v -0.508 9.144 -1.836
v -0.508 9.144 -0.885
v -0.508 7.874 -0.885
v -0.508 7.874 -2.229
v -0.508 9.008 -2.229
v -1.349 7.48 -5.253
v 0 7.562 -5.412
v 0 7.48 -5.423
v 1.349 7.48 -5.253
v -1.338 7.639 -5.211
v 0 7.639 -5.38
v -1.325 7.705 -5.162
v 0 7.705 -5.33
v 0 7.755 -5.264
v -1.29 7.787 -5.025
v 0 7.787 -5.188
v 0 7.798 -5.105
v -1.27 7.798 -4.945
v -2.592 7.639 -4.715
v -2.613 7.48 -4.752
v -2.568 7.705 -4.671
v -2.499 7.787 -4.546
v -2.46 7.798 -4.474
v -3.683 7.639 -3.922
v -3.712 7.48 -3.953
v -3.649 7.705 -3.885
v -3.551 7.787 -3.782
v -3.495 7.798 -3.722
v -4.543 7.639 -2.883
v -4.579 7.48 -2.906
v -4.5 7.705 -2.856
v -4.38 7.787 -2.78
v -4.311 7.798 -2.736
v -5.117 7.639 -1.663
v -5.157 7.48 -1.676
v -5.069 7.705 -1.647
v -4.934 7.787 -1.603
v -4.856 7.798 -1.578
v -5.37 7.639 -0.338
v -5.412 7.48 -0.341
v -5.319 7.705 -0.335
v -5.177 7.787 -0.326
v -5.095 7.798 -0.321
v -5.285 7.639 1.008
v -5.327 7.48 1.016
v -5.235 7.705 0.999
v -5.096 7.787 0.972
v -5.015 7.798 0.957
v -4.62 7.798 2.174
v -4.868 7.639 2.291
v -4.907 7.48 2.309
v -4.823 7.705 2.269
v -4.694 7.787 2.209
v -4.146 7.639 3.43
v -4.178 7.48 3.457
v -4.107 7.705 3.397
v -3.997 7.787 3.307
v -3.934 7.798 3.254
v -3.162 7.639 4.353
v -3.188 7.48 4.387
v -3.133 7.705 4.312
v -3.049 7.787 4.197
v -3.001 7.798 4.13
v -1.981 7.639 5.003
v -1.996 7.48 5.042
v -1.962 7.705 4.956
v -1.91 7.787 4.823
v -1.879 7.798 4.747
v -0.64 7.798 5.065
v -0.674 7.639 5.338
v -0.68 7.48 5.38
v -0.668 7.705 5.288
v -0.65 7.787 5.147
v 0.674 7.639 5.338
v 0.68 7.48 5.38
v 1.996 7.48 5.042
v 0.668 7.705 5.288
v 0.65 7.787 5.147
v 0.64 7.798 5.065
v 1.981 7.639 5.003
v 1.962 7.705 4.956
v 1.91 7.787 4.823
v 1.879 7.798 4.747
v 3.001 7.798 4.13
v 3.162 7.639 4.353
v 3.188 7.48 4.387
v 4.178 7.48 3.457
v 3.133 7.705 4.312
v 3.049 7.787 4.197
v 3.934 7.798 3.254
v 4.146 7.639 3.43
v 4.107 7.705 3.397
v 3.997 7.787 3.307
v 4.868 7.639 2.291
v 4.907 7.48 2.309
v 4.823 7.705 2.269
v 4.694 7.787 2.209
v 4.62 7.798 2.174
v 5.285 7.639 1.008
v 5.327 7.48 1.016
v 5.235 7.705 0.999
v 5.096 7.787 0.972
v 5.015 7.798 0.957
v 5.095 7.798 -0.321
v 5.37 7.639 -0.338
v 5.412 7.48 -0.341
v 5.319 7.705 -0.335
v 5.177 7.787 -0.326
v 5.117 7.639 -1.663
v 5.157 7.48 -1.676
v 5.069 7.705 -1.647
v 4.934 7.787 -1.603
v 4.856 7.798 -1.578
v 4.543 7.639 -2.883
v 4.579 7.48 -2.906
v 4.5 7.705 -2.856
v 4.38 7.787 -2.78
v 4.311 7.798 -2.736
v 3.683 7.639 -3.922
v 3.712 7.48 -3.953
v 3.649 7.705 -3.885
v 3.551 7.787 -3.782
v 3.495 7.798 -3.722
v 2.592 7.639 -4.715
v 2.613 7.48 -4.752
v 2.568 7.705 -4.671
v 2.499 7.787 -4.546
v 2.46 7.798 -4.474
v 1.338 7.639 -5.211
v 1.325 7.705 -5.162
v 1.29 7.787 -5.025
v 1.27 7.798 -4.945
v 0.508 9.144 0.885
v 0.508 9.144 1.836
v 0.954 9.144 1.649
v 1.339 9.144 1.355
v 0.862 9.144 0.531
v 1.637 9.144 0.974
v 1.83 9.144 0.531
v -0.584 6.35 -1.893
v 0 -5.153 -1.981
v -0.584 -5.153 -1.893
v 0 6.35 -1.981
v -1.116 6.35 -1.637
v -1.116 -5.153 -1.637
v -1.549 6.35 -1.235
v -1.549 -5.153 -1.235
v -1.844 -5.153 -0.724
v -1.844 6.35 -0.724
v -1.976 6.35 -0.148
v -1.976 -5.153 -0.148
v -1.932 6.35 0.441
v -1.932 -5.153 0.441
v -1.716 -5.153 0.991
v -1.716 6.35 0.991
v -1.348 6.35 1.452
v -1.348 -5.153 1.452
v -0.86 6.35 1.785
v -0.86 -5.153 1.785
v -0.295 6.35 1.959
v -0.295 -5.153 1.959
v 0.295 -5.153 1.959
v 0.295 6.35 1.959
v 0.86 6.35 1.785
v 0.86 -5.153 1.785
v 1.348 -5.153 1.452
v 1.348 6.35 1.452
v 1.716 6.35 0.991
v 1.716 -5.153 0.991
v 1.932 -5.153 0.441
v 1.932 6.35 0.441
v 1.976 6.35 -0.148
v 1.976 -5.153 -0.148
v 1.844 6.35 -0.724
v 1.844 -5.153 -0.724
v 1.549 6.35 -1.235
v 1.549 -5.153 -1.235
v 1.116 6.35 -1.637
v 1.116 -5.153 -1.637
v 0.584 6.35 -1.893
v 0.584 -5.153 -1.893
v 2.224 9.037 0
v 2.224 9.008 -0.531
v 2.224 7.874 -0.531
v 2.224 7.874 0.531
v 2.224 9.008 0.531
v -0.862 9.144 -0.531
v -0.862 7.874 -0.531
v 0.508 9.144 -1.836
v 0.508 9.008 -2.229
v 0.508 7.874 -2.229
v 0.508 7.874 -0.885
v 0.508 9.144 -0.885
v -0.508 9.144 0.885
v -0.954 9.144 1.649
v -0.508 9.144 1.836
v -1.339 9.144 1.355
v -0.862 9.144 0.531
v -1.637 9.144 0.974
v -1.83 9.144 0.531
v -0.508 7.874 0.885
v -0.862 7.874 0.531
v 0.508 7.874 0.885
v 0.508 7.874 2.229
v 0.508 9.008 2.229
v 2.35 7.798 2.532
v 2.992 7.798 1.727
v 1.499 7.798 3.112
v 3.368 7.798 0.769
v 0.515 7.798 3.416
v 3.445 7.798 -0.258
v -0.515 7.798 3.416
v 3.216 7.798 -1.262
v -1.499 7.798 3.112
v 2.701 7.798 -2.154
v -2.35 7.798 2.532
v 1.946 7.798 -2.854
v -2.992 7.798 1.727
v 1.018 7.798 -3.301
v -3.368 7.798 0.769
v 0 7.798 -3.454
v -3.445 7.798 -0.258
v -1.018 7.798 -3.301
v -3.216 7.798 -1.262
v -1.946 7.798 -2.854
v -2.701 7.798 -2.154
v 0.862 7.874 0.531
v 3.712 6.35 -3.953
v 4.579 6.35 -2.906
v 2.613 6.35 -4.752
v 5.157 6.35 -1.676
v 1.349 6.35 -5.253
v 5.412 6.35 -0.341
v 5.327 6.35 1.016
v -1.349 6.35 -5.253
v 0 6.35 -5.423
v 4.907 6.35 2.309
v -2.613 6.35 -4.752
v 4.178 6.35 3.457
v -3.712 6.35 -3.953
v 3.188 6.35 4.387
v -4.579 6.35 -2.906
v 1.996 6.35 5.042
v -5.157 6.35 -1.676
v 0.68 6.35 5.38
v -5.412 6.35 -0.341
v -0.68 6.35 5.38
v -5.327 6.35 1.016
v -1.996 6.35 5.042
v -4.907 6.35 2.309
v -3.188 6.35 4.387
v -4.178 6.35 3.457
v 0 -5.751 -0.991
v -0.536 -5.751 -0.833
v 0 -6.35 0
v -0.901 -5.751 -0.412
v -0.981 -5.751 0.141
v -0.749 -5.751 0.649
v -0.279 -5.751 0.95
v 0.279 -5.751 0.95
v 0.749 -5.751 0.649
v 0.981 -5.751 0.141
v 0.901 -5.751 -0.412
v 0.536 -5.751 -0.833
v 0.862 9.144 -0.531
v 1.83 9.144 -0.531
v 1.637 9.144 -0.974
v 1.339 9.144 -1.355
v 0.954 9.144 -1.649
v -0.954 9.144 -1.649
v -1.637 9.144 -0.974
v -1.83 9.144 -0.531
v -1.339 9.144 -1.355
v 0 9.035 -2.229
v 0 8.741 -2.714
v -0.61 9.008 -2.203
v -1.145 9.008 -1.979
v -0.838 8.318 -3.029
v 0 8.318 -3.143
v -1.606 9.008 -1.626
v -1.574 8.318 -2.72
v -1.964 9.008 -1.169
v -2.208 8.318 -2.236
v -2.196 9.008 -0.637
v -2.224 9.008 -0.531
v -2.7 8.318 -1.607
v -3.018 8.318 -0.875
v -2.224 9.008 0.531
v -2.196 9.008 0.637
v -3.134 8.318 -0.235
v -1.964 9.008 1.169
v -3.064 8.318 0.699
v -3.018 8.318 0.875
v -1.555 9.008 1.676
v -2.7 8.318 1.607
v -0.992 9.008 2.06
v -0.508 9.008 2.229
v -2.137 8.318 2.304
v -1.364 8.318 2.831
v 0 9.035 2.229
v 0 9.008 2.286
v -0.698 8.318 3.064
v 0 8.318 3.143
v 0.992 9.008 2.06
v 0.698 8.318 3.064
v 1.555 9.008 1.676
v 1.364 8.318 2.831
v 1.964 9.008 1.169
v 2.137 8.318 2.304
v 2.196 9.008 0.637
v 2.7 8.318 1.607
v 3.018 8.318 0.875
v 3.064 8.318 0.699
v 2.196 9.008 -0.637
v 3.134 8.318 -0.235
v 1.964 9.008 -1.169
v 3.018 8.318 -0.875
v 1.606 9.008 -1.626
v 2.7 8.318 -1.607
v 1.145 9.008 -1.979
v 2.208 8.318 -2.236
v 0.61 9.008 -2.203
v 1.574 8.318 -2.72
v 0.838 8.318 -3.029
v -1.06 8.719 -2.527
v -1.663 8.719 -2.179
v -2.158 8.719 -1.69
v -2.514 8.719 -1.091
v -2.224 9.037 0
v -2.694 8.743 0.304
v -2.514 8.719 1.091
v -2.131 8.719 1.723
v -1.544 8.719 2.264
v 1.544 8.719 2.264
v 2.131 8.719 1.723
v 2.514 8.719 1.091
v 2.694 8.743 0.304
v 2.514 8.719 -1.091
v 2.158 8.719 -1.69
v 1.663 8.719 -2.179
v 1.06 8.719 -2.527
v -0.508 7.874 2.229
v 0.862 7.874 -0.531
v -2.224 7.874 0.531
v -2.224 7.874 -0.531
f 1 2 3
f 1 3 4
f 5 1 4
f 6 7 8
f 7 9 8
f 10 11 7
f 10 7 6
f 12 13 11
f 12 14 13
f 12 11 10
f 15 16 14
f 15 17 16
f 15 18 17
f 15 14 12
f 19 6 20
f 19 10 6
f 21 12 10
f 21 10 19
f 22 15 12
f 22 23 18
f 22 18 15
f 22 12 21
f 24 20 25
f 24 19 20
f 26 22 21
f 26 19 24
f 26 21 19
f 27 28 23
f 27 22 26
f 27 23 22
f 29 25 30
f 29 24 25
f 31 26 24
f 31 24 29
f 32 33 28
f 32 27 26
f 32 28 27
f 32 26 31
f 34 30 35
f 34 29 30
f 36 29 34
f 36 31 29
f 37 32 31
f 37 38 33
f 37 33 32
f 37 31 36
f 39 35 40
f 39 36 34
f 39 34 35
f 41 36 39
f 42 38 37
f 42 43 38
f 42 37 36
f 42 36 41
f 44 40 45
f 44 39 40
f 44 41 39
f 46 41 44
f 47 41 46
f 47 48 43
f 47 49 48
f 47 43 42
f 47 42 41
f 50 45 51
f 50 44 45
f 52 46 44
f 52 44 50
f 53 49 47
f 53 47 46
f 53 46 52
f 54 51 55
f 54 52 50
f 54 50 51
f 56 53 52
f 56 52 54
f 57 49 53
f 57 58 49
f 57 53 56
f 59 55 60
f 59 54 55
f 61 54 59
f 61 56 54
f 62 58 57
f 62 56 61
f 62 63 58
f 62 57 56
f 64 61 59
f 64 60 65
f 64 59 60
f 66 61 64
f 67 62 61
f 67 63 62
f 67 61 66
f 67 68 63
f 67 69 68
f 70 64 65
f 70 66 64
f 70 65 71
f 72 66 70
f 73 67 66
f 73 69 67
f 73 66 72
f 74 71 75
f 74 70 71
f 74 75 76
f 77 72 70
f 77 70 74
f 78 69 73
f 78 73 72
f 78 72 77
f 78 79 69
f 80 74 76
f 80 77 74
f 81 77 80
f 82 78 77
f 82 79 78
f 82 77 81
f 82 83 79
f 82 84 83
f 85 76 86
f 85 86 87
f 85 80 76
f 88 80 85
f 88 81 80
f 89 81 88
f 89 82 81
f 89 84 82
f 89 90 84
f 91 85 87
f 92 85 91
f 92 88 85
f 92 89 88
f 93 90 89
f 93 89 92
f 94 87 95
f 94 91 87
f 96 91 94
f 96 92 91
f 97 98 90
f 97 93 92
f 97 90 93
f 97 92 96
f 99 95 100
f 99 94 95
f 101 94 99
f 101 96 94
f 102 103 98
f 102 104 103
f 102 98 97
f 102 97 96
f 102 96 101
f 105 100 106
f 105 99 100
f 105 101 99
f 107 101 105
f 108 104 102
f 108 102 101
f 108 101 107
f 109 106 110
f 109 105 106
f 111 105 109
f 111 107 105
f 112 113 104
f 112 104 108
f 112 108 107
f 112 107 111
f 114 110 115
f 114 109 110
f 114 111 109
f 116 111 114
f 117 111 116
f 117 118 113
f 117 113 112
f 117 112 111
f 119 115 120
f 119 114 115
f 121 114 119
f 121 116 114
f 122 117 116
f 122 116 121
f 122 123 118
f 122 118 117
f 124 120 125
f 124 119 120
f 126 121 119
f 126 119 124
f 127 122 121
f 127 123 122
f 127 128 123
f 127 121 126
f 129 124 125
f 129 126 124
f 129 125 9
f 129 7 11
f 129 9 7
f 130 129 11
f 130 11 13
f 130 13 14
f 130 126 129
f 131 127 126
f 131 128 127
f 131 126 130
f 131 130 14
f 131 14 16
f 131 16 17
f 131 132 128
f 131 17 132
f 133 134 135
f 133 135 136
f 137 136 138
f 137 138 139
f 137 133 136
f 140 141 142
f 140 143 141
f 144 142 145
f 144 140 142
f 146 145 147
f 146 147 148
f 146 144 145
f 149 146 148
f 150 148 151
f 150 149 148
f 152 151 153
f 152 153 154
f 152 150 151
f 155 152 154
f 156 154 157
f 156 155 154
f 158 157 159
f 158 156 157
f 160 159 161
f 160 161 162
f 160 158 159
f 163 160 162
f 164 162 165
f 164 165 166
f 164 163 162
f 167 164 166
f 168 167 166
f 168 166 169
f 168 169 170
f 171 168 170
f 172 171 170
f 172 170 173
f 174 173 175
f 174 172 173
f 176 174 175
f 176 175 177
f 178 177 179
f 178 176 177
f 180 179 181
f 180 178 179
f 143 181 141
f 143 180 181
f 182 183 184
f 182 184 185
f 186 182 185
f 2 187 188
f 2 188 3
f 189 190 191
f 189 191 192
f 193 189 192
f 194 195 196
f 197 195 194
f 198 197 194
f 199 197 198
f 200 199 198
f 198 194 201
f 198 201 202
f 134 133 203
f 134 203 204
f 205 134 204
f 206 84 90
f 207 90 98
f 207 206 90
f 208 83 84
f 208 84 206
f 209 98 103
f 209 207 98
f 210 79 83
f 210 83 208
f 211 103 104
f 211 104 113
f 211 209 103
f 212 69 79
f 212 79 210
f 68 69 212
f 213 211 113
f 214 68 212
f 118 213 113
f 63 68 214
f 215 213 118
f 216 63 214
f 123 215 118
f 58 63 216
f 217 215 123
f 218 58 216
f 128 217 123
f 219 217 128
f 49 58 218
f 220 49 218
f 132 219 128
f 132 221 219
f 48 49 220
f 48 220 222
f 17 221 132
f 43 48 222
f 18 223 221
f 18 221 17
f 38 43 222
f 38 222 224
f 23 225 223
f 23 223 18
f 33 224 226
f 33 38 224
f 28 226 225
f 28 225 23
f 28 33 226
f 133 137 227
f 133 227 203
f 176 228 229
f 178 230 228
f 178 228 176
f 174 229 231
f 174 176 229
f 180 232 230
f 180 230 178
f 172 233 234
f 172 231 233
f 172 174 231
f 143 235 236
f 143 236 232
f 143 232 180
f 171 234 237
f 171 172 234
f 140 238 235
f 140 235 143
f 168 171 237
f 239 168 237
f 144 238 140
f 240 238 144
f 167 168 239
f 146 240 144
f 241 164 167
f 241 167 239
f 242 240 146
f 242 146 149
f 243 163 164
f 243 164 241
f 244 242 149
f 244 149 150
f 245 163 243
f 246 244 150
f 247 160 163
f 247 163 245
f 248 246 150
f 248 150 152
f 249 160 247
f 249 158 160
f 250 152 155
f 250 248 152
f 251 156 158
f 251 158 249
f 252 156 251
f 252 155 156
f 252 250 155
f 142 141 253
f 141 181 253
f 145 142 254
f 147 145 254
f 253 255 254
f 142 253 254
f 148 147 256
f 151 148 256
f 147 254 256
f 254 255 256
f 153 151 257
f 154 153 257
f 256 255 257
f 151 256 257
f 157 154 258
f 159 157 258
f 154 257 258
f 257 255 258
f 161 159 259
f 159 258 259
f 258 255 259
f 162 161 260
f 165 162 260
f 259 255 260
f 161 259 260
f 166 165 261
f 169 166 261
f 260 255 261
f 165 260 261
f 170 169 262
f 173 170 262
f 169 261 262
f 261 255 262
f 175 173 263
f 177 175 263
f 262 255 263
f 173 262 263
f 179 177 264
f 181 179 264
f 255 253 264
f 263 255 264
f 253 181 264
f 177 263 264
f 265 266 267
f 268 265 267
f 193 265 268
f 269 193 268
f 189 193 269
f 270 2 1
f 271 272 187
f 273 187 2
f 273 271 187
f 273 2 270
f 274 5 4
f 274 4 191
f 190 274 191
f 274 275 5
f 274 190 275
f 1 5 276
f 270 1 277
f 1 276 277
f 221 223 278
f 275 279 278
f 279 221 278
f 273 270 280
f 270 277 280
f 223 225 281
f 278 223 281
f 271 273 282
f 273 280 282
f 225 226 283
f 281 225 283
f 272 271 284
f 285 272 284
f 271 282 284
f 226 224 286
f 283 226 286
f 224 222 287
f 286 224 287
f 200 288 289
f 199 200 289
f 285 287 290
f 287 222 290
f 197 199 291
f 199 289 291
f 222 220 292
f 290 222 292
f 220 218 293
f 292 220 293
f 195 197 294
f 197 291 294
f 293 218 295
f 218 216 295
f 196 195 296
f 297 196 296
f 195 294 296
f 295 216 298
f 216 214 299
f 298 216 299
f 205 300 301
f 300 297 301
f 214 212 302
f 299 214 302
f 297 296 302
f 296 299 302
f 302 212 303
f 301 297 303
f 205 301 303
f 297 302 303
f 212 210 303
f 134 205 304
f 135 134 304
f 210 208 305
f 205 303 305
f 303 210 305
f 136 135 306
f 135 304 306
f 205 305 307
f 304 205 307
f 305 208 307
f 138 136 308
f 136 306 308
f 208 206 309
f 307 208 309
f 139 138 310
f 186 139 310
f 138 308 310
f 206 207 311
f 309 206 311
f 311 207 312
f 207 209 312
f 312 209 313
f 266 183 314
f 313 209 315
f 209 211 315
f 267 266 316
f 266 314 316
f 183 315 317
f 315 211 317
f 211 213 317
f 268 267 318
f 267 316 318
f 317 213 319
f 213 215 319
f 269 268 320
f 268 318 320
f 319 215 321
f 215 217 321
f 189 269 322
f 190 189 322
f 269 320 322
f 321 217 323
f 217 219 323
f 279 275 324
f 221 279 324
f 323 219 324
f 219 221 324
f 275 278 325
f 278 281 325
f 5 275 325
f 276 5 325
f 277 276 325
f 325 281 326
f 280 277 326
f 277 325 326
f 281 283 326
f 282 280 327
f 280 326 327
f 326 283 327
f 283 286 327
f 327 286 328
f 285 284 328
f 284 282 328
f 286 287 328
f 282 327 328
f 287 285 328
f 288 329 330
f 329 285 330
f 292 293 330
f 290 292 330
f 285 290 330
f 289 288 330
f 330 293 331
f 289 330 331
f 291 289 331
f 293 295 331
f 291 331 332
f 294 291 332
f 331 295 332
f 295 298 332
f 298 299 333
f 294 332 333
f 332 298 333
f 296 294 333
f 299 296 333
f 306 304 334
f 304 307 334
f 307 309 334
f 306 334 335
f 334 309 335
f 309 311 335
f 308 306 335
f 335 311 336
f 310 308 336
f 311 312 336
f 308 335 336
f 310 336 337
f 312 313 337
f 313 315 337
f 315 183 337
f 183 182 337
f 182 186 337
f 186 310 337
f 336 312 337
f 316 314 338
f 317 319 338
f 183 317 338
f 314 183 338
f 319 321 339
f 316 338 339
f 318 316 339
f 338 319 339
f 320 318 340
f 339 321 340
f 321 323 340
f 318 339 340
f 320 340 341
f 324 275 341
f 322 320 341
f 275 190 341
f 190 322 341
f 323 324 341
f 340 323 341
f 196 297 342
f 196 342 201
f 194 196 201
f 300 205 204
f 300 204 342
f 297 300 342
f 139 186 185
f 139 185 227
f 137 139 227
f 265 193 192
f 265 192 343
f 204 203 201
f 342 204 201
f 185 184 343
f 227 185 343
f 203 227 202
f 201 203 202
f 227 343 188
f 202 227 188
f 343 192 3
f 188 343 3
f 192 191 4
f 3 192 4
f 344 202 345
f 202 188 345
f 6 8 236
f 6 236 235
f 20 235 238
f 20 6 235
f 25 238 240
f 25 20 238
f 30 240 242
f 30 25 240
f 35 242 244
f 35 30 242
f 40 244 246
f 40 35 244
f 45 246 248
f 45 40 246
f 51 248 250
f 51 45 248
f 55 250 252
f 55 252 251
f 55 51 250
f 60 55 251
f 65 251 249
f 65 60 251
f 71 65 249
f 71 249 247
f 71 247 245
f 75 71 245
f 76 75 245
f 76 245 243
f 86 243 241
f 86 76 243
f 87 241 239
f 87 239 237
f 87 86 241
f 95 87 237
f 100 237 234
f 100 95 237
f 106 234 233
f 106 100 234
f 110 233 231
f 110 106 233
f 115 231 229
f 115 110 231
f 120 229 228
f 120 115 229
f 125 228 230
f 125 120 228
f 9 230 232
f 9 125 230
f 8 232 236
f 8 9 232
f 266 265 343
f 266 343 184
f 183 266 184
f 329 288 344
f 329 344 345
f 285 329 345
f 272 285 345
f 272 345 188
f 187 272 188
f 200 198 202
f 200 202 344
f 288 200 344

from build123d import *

# Parameters (mm, degrees)
SKETCH2_W          = 1.9812
SKETCH2_H          = 6.35
CUT_EXTRUDE1_DEPTH = 1.27
FILLET1_R          = 0.3175


with BuildPart() as part:
    # Sketch2 → Revolve2 (revolve)
    with BuildSketch(Plane(origin=(0, 0, 0), x_dir=(0, 0, -1), z_dir=(1, 0, 0))):
        with BuildLine():
            Line((0, 9.144), (0, 7.7978))
            Line((0, 7.7978), (3.4544, 7.7978))
            add(Edge.make_bspline(
                [(1.905, 9.144), (2.485859984, 9.013201575), (3.169812282, 8.481844182), (3.4544, 7.7978)],
                knots=[0, 0, 0, 0, 1, 1, 1, 1], degree=3))
            Line((1.905, 9.144), (0, 9.144))
        make_face()
        Polygon((0, 7.7978), (0, 6.35), (1.9812, 6.35), (5.4229, 6.35), (5.4229, 7.7978), (3.4544, 7.7978), align=None)
        with Locations((0.9906, 3.175)):
            Rectangle(SKETCH2_W, SKETCH2_H)
        Polygon((1.9812, -5.152618014), (0, -6.35), (0, 0), (1.9812, 0), align=None)
    revolve(axis=Axis((0, 0, 0), (0, 1, 0)))

    # Sketch4 → Cut-Extrude1 (cut)
    with BuildSketch(Plane(origin=(0, 9.144, 0), x_dir=(1, 0, 0), z_dir=(0, 1, 0))):
        Polygon((-0.508, 2.228840954), (0.508, 2.228840954), (0.508, 0.884564976), (0.861964761, 0.530600214), (2.223569071, 0.530600214), (2.223569071, -0.530600214), (0.861964761, -0.530600214), (0.508, -0.884564976), (0.508, -2.228840954), (-0.508, -2.228840954), (-0.508, -0.884564976), (-0.861964761, -0.530600214), (-2.223569071, -0.530600214), (-2.223569071, 0.530600214), (-0.861964761, 0.530600214), (-0.508, 0.884564976), align=None)
    extrude(amount=-CUT_EXTRUDE1_DEPTH, mode=Mode.SUBTRACT)

    # Fillet1
    fillet1_edges = [part.edges().sort_by_distance(p)[0] for p in [
        (0, 7.7978, 5.4229),
    ]]
    fillet(fillet1_edges, radius=FILLET1_R)


solid = part.part
